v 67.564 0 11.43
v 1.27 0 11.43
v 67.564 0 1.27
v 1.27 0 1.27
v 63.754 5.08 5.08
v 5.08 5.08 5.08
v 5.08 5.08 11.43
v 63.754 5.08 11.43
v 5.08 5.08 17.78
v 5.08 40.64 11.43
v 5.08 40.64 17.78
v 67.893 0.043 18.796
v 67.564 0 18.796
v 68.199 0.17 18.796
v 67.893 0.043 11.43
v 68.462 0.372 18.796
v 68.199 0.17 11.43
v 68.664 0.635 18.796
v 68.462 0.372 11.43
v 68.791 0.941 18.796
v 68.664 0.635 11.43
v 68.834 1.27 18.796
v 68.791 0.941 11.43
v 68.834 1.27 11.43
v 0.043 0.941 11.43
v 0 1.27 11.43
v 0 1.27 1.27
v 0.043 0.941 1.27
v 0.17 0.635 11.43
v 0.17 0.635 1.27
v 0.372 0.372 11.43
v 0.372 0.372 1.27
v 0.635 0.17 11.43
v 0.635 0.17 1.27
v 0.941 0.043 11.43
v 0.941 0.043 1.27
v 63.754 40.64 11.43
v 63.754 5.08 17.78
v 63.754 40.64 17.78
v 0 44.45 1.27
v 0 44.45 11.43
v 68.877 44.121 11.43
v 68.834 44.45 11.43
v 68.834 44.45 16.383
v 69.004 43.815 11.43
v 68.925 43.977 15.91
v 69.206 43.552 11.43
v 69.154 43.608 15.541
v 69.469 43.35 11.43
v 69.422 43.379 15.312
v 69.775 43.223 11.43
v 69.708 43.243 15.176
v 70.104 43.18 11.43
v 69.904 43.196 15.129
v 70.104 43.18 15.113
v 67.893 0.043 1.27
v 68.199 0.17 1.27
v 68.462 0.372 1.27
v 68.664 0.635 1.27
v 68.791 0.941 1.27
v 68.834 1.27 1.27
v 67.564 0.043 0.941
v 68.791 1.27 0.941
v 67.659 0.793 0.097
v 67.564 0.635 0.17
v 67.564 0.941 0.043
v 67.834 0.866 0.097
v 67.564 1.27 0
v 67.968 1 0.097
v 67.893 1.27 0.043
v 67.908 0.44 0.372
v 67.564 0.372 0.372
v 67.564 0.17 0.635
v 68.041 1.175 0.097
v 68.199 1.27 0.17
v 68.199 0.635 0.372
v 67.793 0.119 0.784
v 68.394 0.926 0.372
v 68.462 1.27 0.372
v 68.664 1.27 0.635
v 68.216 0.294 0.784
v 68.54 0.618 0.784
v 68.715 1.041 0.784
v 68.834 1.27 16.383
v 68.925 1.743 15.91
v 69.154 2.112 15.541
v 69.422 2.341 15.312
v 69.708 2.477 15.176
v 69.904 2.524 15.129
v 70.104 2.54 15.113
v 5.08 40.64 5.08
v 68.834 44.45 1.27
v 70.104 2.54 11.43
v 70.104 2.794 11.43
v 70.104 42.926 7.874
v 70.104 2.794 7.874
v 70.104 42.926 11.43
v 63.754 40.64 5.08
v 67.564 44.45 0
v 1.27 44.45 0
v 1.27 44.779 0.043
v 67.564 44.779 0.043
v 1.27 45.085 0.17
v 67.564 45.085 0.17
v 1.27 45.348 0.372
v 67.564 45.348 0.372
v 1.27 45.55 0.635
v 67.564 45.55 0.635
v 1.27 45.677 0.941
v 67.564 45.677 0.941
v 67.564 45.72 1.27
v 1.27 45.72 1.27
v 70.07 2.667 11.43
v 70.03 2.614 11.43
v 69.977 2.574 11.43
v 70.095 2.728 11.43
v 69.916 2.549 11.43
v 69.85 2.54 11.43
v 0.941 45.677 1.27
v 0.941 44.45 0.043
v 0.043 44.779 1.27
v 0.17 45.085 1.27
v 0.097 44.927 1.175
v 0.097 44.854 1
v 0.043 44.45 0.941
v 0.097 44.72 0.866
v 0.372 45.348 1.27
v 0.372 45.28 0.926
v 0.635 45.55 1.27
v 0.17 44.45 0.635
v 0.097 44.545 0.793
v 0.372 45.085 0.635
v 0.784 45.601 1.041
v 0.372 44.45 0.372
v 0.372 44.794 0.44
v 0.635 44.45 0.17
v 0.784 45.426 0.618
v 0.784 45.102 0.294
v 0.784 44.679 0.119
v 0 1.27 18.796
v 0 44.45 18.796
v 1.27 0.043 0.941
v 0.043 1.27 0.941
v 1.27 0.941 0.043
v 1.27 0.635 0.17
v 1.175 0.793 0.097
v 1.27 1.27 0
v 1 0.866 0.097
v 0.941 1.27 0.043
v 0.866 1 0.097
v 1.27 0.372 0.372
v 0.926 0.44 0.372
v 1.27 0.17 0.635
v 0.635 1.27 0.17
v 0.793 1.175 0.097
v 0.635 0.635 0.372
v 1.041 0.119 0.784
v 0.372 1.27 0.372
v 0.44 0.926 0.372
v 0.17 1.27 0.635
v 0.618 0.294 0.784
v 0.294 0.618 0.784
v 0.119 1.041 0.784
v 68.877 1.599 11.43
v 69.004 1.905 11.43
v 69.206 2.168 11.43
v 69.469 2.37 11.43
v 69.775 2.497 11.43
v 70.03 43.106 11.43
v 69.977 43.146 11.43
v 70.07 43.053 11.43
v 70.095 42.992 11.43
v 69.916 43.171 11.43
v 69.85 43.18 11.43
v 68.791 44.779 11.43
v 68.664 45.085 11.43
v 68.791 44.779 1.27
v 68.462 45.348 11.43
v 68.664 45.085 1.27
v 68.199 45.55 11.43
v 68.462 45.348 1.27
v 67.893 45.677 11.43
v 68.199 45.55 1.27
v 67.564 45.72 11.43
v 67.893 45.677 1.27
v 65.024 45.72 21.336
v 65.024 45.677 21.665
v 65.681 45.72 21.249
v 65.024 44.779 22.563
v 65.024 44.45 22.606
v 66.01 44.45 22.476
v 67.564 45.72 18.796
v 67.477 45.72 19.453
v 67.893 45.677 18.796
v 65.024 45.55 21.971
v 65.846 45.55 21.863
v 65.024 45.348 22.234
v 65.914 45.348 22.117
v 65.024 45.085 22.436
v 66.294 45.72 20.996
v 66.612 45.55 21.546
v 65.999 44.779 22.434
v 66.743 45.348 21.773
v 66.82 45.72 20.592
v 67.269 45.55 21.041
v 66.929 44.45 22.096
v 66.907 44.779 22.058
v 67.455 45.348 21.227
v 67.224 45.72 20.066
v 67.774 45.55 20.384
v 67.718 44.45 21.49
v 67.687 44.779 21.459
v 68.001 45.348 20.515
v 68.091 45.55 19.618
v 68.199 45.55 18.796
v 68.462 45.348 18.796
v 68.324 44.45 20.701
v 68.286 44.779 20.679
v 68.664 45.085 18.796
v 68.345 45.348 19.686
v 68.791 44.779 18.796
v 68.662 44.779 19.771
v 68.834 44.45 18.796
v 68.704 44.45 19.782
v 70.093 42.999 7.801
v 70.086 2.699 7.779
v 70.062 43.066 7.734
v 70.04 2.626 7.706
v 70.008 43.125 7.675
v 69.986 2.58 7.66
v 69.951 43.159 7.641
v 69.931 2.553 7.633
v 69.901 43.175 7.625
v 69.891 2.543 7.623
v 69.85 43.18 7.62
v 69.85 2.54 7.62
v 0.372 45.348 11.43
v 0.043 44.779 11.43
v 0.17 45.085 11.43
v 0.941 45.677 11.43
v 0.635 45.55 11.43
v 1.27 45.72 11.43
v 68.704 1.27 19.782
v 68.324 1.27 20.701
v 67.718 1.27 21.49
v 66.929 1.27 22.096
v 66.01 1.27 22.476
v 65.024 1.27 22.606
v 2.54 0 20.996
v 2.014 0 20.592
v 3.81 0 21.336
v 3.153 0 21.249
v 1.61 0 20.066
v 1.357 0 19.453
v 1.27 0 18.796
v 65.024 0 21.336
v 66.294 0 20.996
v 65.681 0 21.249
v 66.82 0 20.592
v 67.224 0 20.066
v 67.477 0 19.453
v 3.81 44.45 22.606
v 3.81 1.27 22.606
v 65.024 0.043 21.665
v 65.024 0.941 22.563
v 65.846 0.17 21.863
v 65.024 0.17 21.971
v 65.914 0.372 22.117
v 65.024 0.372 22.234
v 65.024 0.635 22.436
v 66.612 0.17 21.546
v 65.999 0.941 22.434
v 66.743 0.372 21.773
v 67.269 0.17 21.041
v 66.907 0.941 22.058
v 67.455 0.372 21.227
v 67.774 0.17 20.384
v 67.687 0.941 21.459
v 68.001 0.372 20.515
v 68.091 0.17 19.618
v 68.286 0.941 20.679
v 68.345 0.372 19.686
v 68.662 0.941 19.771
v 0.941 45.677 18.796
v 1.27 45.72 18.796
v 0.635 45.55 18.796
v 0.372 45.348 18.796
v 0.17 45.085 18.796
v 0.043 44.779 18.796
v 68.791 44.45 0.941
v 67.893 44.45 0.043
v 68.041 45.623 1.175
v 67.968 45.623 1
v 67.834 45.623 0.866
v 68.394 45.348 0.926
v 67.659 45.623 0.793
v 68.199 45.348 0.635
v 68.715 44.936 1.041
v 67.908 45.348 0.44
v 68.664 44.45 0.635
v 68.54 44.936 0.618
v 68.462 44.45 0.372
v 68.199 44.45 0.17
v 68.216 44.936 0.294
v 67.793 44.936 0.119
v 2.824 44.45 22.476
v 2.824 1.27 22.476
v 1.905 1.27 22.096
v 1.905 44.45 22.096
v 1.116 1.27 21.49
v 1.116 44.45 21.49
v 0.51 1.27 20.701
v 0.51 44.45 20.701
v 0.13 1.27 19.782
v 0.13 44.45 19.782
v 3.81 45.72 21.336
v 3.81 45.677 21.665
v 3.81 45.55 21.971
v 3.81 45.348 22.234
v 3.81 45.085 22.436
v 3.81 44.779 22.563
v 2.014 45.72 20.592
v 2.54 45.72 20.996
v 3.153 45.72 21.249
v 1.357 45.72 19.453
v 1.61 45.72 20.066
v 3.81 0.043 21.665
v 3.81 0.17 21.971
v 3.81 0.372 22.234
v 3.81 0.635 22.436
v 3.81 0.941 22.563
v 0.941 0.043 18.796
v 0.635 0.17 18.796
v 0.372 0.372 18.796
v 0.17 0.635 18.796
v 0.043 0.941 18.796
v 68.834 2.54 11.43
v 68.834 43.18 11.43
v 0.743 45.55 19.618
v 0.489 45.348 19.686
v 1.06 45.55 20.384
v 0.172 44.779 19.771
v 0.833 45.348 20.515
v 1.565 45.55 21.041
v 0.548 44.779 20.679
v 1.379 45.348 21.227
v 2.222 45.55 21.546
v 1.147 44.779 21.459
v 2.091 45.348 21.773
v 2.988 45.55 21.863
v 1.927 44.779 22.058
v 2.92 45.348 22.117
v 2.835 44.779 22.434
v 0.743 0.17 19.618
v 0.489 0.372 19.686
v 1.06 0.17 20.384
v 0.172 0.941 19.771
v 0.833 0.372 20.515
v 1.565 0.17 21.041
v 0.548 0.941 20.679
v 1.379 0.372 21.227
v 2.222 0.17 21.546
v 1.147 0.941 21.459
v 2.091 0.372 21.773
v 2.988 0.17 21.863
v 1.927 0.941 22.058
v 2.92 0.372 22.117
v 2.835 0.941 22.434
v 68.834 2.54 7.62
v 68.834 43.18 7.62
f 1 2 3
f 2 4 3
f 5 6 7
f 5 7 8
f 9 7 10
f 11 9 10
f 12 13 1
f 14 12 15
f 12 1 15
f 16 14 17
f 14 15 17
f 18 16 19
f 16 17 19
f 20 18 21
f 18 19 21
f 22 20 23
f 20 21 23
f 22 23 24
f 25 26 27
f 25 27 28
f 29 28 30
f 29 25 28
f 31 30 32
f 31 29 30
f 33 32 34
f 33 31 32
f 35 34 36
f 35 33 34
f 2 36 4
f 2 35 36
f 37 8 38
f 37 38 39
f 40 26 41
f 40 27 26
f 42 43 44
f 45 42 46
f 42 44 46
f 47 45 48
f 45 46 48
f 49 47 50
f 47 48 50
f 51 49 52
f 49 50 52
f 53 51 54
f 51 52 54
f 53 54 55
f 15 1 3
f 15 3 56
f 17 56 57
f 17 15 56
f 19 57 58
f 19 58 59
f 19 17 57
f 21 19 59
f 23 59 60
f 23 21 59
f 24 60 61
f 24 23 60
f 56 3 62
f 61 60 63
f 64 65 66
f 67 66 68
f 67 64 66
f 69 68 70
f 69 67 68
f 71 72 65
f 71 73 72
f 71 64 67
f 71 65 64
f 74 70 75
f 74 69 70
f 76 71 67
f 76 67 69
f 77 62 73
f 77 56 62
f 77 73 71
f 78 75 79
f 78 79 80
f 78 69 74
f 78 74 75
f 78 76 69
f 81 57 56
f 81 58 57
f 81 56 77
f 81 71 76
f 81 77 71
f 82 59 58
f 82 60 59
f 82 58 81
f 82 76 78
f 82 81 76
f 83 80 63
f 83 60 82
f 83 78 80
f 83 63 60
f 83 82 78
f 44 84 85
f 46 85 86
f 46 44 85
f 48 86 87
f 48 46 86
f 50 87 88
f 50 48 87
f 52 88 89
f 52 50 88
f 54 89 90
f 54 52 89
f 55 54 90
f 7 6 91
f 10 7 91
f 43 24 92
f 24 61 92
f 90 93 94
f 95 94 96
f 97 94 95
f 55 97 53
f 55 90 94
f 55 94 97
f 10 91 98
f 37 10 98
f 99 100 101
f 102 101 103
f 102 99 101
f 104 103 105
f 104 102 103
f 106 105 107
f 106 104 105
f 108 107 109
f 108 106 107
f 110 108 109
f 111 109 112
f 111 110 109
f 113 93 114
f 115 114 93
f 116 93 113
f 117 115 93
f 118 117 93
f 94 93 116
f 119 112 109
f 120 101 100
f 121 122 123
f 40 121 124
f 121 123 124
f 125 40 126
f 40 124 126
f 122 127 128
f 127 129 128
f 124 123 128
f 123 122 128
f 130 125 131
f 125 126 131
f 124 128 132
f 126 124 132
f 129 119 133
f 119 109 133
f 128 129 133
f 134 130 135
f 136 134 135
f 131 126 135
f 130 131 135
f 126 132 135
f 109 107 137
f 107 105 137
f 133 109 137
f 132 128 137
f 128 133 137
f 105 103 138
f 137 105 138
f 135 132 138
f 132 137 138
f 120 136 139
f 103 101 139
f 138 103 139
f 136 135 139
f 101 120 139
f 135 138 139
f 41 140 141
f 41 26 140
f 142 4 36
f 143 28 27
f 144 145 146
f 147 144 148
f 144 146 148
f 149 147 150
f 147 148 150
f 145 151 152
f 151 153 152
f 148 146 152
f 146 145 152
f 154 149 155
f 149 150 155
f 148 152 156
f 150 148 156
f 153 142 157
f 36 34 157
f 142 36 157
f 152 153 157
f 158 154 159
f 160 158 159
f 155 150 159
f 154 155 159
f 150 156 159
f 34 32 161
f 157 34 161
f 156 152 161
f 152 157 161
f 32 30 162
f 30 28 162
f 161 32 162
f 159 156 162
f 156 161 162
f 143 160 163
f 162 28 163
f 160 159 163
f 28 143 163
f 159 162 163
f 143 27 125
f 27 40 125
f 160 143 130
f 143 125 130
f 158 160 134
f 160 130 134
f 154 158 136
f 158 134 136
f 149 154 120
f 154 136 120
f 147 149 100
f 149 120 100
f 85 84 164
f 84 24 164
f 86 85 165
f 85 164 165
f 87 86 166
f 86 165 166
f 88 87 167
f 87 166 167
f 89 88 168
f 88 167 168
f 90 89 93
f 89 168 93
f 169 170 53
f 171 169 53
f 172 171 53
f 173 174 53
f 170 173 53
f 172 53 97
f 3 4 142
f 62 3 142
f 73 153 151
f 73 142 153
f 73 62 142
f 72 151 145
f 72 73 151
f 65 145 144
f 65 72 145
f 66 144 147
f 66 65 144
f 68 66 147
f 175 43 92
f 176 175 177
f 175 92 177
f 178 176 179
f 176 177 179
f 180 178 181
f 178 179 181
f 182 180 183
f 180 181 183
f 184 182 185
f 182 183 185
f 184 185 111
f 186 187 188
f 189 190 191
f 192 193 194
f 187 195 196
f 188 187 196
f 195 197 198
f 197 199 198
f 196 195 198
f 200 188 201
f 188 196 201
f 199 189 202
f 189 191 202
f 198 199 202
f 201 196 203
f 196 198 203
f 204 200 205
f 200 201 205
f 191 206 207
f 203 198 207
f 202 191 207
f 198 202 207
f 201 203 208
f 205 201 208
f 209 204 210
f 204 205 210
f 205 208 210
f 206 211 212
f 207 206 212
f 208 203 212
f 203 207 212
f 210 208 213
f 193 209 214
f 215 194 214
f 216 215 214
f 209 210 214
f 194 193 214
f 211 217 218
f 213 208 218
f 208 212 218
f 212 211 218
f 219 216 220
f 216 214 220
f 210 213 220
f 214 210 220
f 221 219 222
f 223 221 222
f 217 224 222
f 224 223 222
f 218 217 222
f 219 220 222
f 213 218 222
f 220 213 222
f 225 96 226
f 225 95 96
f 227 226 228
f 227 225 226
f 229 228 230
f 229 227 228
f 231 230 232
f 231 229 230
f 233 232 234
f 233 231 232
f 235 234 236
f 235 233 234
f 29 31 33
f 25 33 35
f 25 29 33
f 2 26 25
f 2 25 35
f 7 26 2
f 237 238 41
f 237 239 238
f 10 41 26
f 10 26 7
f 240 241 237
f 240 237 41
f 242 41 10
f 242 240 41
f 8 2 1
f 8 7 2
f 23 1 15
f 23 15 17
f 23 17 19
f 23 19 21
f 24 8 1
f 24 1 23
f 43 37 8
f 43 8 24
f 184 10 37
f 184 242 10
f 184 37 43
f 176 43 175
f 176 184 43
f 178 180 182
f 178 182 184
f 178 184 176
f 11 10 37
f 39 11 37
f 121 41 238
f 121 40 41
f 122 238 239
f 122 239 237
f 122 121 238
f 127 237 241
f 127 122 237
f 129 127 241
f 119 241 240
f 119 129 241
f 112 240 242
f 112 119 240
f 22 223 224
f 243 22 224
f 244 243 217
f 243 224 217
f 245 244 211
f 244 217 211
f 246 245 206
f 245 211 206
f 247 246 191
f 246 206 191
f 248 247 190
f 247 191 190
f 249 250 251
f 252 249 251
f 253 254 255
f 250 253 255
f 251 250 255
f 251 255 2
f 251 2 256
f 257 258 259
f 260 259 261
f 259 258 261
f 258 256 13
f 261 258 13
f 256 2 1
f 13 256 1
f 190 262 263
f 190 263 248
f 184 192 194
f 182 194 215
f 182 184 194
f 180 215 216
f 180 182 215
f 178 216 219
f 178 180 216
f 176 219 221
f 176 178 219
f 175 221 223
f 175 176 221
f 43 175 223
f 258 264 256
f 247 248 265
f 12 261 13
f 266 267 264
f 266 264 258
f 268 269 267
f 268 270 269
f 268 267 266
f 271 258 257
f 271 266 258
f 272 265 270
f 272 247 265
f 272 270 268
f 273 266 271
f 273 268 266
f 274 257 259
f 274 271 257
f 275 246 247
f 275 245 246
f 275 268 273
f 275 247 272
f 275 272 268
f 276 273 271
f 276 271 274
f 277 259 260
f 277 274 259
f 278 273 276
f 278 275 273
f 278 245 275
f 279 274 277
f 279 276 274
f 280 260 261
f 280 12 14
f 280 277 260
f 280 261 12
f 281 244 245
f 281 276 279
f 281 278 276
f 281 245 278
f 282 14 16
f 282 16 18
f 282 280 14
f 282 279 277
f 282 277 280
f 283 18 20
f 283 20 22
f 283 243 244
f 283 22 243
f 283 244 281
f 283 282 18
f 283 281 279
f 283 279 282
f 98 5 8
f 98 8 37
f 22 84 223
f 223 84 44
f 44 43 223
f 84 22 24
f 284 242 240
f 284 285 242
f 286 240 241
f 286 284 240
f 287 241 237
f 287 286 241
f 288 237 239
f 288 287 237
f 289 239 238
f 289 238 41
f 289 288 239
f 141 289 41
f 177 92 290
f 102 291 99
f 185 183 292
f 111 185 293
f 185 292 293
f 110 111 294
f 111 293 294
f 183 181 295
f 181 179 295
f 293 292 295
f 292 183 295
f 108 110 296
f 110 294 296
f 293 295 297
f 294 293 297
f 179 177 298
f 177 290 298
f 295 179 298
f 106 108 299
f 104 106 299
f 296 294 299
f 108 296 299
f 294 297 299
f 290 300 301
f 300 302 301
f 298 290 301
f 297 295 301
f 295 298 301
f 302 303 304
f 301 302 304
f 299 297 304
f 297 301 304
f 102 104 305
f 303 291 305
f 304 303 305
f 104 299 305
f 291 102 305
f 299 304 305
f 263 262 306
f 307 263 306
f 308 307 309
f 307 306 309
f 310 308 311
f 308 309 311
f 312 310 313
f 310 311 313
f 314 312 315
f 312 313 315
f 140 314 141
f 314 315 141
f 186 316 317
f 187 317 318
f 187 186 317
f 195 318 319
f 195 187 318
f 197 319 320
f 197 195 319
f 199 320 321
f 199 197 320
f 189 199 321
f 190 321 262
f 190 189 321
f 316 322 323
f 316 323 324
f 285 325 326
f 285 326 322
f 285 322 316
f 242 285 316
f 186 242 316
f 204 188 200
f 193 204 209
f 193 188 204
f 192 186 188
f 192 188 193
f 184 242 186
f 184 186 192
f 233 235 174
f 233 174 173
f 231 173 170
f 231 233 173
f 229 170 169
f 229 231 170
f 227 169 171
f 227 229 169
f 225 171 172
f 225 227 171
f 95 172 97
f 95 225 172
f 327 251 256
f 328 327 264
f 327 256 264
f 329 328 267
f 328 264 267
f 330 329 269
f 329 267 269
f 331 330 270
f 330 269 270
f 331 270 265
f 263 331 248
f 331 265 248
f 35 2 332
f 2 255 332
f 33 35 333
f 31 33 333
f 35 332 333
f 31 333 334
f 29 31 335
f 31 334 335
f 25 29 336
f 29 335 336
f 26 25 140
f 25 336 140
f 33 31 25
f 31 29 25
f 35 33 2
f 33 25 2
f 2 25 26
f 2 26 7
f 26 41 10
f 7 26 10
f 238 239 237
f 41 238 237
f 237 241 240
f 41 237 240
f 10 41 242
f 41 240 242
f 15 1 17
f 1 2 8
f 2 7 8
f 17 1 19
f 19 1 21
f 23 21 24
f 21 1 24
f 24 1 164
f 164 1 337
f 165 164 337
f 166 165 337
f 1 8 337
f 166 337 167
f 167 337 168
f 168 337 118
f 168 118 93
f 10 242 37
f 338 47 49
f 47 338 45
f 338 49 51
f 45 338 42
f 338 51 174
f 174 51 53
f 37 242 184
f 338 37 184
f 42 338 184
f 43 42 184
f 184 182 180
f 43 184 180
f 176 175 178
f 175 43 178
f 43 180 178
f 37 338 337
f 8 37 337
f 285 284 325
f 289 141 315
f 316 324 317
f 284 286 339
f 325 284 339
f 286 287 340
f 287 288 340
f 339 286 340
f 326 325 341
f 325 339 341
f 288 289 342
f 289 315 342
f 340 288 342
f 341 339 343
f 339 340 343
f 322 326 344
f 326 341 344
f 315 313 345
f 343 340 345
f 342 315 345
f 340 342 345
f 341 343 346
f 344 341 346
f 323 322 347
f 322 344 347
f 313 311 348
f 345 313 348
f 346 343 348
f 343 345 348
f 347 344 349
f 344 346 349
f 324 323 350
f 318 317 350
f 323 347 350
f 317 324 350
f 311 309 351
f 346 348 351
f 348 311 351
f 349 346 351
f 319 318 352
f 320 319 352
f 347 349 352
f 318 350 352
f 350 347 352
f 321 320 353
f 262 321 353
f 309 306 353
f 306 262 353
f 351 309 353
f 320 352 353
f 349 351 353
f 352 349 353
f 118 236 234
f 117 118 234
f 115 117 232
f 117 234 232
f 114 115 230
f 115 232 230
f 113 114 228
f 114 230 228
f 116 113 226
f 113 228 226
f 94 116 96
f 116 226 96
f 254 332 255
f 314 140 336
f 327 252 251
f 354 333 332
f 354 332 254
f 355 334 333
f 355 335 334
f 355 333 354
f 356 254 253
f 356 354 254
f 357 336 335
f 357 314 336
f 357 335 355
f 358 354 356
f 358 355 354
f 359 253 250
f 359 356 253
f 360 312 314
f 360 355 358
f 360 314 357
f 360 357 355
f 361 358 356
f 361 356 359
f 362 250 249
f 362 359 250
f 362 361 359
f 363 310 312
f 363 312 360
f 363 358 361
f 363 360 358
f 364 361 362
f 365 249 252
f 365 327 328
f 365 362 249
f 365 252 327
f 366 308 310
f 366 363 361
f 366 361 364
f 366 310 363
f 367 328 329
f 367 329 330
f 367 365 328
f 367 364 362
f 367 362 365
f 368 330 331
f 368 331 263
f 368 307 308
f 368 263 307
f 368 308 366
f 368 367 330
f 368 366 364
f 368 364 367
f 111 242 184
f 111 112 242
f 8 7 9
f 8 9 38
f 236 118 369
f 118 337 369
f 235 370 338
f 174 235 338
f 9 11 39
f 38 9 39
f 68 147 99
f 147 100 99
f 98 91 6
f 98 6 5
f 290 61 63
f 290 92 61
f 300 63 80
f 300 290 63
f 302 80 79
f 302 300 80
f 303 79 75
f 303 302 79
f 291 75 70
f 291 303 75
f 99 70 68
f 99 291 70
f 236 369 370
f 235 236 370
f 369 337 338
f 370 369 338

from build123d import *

# Parameters (mm, degrees)
F0_W         = 68.834
F0_H         = 45.72
F1_DEPTH     = 5.08
F2_W         = 68.834
F2_H         = 45.72
F2_W_2       = 58.674
F2_H_2       = 35.56
F3_DEPTH     = 6.35
F4_W         = 68.834
F4_H         = 45.72
F4_W_2       = 58.674
F4_H_2       = 35.56
F5_DEPTH     = 6.35
F6_W         = 68.834
F6_H         = 45.72
F7_DEPTH     = 4.826
F8_W         = 40.64
F8_H         = 3.81
F8_H_2       = 3.683
F9_DEPTH     = 1.27
F10_R        = 3.81
F11_R        = 1.26999
F11_2_R      = 1.26999
F12_T1_DEPTH = 4.4450001001
F12_T3_DEPTH = 41.91


# Not quite as in the source:
# - a fillet or chamfer that OpenCascade refuses, or shapes differently, is made with other operations: its cross-section is extruded or revolved along the edge and cut away or added
# - a fillet or chamfer is up to 0.001 mm smaller than in the source, because OpenCascade refuses the exact size
# - a feature names something its author has since deleted; it is built from what else it names


with BuildPart() as f1:
    # F0 (on Top) → F1 (new body)
    with BuildSketch(Plane.XY):
        with Locations((34.417, 22.86)):
            Rectangle(F0_W, F0_H)
    extrude(amount=F1_DEPTH)

    # F2 (on face) → F3 (join)
    with BuildSketch(Plane.XY.offset(5.08)):
        with Locations((34.417, 22.86)):
            Rectangle(F2_W, F2_H)
        with Locations((34.417, 22.86)):
            Rectangle(F2_W_2, F2_H_2, mode=Mode.SUBTRACT)
    extrude(amount=F3_DEPTH)

    # F11 (radius 1.27 in the source; OpenCascade refuses exactly that, so slightly less here)
    f11_edges = [f1.edges().sort_by_distance(p)[0] for p in [
        (68.834, 0, 5.715),
        (0, 0, 5.715),
        (34.417, 0, 0),
        (68.834, 22.86, 0),
        (68.834, 45.72, 5.715),
        (34.417, 45.72, 0),
        (0, 45.72, 5.715),
        (0, 22.86, 0),
    ]]
    fillet(f11_edges, radius=F11_R)


with BuildPart() as f5:
    # F4 (on face) → F5 (new body)
    with BuildSketch(Plane.XY.offset(11.43)):
        with Locations((34.417, 22.86)):
            Rectangle(F4_W, F4_H)
        with Locations((34.417, 22.86)):
            Rectangle(F4_W_2, F4_H_2, mode=Mode.SUBTRACT)
    extrude(amount=F5_DEPTH)

    # F6 (on face) → F7 (join)
    with BuildSketch(Plane.XY.offset(17.78)):
        with Locations((34.417, 22.86)):
            Rectangle(F6_W, F6_H)
    extrude(amount=F7_DEPTH)

    # F8 (on face) → F9 (join)
    with BuildSketch(Plane.YZ.offset(68.834)):
        with Locations((22.86, 9.525)):
            Rectangle(F8_W, F8_H)
        with Locations((22.86, 13.2715)):
            Rectangle(F8_W, F8_H_2)
    extrude(amount=F9_DEPTH)

    # F10
    f10_edges = [f5.edges().sort_by_distance(p)[0] for p in [
        (68.834, 22.86, 22.606),
        (0, 22.86, 22.606),
    ]]
    fillet(f10_edges, radius=F10_R)

    # F11#2 (radius 1.27 in the source; OpenCascade refuses exactly that, so slightly less here)
    f11_2_edges = [f5.edges().sort_by_distance(p)[0] for p in [
        (34.417, 0, 22.606),
        (34.417, 45.72, 22.606),
        (68.834, 22.86, 15.113),
        (68.834, 2.54, 13.2715),
        (68.834, 43.18, 13.2715),
        (68.834, 45.72, 15.113),
        (67.718077, 45.72, 21.490077),
        (0, 45.72, 15.113),
        (1.115923, 45.72, 21.490077),
        (68.834, 0, 15.113),
        (67.718077, 0, 21.490077),
        (0, 0, 15.113),
        (1.115923, 0, 21.490077),
    ]]
    fillet(f11_2_edges, radius=F11_2_R)

    # F12: fillet of radius 0.254 on 7 edges, made by hand

    # F12_s2 → F12_t1 (cut)
    with BuildSketch(Plane.XY.offset(6.985)):
        with BuildLine():
            ThreePointArc((69.85, 2.54), (70.0296051224, 2.6143948776), (70.104, 2.794))
            Line((70.104, 2.794), (70.104, 2.54))
            Line((70.104, 2.54), (69.85, 2.54))
        make_face()
        with BuildLine():
            ThreePointArc((69.85, 43.18), (70.0296051224, 43.1056051224), (70.104, 42.926))
            Line((70.104, 42.926), (70.104, 43.18))
            Line((70.104, 43.18), (69.85, 43.18))
        make_face()
    extrude(amount=F12_T1_DEPTH, mode=Mode.SUBTRACT)

    # F12_s4 → F12_t3 (cut)
    with BuildSketch(Plane.XZ.offset(-43.815)):
        with BuildLine():
            ThreePointArc((70.104, 7.874), (70.0296051224, 7.6943948776), (69.85, 7.62))
            Line((69.85, 7.62), (70.104, 7.62))
            Line((70.104, 7.62), (70.104, 7.874))
        make_face()
    extrude(amount=F12_T3_DEPTH, mode=Mode.SUBTRACT)


solid = Compound([f1.part, f5.part])
